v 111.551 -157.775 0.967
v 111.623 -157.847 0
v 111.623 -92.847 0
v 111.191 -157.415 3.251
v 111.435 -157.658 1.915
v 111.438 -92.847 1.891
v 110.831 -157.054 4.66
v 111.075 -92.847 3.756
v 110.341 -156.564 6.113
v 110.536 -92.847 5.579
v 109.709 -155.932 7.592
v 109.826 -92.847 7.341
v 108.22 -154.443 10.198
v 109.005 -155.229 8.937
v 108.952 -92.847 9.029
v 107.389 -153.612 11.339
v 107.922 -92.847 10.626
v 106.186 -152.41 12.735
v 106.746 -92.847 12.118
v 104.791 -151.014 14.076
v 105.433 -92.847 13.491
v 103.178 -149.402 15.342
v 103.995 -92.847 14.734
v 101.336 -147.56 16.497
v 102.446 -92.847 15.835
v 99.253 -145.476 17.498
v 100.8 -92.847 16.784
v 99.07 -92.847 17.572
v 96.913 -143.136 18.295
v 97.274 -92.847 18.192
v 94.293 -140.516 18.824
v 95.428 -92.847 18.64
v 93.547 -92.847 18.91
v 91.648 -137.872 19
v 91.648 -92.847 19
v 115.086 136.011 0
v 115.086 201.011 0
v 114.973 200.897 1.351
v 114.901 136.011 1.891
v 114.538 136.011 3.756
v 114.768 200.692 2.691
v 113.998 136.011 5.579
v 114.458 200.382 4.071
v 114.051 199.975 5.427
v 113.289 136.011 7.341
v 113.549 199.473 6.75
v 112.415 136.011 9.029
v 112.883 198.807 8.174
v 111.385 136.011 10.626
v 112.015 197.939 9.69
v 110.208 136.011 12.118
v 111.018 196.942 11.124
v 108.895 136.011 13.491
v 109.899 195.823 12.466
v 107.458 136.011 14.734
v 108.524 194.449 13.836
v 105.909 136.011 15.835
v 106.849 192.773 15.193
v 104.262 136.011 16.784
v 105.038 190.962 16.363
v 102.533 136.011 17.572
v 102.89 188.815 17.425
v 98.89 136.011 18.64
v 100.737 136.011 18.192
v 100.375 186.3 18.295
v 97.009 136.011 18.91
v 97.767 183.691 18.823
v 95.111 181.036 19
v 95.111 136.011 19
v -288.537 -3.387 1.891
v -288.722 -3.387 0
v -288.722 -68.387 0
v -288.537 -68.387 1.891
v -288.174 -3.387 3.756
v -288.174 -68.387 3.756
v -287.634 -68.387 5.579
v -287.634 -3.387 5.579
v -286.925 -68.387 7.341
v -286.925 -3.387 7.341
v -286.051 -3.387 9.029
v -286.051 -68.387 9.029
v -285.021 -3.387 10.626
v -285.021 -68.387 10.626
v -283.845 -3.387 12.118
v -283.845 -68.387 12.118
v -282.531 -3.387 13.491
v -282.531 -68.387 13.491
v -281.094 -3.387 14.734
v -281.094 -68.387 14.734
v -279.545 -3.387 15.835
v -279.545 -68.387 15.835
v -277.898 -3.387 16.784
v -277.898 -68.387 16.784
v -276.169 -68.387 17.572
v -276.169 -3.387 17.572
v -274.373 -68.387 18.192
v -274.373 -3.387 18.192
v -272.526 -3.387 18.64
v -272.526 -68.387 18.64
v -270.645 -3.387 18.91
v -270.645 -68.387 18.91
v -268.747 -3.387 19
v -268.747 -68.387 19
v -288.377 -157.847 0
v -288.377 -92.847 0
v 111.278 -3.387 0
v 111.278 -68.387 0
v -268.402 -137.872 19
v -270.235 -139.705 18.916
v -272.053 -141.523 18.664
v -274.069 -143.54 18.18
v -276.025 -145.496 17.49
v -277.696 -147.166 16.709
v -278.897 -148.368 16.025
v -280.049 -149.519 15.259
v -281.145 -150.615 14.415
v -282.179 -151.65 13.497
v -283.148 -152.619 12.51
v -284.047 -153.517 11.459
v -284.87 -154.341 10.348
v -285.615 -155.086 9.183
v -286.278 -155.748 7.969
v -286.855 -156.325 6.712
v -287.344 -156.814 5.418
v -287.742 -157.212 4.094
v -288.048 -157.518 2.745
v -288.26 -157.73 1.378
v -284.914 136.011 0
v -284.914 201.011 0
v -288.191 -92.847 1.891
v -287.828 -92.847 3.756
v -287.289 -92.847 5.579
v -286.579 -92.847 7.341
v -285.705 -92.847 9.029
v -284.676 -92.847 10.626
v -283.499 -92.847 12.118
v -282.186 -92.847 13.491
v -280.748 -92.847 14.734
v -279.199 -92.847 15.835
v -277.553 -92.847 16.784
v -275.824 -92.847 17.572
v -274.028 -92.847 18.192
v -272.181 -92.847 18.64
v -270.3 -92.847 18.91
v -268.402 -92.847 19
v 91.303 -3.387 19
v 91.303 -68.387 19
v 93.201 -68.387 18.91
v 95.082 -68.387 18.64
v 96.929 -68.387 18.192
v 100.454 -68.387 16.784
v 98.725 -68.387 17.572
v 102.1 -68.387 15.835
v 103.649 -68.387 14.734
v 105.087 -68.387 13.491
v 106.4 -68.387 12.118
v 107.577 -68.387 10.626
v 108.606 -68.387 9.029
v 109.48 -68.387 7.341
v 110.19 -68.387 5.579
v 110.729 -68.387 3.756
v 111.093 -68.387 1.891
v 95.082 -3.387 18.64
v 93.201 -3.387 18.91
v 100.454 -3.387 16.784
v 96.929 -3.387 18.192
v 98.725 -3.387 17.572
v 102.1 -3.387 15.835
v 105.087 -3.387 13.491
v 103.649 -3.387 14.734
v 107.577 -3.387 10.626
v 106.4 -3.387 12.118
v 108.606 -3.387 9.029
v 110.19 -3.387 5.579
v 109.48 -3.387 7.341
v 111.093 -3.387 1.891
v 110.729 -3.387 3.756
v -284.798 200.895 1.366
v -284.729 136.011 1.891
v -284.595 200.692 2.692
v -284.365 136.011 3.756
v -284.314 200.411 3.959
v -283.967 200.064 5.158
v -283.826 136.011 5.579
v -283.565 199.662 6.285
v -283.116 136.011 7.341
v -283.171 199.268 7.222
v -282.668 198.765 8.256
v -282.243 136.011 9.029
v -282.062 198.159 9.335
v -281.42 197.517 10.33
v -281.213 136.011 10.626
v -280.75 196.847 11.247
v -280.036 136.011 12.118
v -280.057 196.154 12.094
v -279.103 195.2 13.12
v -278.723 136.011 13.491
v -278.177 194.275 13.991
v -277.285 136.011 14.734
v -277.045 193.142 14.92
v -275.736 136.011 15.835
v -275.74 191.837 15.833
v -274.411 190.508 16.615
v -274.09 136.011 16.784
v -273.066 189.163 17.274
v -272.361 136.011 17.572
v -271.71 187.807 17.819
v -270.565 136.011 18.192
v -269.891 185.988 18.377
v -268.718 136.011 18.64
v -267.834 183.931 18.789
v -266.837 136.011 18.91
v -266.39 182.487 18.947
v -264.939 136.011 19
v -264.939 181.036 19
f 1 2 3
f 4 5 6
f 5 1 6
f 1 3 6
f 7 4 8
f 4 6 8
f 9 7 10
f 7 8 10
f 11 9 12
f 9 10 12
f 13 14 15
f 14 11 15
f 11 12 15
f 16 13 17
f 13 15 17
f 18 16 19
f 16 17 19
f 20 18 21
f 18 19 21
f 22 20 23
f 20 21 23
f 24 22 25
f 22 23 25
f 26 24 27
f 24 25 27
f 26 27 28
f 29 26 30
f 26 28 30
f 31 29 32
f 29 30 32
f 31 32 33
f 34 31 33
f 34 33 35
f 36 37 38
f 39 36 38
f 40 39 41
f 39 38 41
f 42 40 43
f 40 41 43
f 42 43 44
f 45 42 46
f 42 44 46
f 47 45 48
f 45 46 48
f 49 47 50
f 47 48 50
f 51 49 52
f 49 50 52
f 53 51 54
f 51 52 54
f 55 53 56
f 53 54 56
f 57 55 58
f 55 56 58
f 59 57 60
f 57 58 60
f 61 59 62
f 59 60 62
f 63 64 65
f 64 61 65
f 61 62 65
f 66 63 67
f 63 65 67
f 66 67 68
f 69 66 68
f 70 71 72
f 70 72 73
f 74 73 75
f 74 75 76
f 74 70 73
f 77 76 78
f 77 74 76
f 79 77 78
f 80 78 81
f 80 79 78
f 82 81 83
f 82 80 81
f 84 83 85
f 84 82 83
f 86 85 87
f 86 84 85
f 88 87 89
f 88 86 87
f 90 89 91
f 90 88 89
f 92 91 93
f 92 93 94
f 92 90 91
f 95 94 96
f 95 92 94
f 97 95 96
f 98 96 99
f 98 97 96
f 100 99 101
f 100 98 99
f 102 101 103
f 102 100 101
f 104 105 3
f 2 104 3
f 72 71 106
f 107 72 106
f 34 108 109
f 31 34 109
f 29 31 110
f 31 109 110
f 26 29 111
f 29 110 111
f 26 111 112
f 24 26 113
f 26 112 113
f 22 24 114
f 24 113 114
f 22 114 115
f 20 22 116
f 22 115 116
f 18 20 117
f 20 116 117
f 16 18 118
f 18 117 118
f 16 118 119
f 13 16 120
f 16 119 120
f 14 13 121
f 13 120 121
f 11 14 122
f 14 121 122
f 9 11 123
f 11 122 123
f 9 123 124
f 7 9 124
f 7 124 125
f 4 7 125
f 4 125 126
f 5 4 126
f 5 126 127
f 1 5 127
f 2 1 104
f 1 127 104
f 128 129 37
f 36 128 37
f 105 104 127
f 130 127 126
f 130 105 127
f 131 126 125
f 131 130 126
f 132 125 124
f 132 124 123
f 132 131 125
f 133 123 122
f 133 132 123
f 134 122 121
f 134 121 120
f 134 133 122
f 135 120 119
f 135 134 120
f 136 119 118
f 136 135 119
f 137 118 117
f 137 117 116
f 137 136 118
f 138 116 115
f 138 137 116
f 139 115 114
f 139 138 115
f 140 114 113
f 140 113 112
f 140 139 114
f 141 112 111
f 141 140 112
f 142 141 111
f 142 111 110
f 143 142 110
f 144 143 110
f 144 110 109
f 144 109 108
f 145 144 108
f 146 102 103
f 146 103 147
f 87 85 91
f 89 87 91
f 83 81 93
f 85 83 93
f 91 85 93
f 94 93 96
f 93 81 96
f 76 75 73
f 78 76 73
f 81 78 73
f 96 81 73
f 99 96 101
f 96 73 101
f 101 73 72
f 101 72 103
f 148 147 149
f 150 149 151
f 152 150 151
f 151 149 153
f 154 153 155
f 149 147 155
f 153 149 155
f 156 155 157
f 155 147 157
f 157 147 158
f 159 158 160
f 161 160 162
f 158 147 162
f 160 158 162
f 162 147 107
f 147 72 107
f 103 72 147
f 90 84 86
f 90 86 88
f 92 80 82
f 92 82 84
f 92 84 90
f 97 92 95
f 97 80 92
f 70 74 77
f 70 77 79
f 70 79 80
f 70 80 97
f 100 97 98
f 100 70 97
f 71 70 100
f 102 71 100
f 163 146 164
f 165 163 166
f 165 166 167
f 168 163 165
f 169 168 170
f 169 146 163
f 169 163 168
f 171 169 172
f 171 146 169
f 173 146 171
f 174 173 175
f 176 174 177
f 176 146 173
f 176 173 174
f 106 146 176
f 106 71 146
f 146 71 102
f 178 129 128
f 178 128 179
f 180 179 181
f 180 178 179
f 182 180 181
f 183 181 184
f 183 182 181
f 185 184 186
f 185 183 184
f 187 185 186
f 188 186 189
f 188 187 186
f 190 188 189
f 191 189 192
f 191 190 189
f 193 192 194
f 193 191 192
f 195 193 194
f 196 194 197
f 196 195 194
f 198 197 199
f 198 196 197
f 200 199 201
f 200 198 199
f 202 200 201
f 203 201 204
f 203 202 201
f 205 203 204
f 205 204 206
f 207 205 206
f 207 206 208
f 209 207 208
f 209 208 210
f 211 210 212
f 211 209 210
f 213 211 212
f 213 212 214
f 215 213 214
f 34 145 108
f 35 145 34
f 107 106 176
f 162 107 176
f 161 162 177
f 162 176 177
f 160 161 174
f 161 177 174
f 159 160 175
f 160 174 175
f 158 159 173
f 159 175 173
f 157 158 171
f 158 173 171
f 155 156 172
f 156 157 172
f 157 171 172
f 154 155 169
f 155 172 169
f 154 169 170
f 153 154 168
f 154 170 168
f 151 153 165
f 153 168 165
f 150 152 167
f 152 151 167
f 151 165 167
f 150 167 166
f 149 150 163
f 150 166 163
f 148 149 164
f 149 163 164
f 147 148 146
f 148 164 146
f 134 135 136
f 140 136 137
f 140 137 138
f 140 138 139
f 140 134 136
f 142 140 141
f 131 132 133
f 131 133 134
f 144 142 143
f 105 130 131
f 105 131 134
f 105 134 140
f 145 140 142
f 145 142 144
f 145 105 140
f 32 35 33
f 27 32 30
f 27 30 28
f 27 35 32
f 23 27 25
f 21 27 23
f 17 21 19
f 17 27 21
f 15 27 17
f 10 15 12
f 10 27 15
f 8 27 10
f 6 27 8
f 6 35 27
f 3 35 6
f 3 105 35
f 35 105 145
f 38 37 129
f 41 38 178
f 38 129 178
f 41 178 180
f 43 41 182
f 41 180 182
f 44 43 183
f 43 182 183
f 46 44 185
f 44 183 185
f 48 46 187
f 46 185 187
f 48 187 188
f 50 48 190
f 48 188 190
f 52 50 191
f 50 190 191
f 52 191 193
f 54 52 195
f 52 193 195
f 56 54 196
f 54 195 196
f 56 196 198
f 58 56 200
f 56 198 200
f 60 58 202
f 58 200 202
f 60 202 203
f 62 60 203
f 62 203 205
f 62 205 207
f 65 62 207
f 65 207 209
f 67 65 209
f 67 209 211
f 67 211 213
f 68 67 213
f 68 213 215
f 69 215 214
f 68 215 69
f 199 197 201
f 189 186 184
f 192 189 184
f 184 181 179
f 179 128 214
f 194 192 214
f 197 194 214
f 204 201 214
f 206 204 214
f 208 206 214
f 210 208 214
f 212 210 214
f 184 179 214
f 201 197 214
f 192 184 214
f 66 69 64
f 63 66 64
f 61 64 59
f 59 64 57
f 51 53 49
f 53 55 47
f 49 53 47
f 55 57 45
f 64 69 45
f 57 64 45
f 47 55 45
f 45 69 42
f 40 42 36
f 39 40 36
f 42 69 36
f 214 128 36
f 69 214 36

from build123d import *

# Parameters (mm, degrees)
F0_W         = 400
F0_H         = 65
F1_DEPTH     = 19
F2_W         = 400
F2_H         = 65
F3_DEPTH     = 19
F4_W         = 400
F4_H         = 65
F5_DEPTH     = 19
F6_T1_DEPTH  = 164.8749217772
F7_T1_DEPTH  = 164.8749217772
F8_T1_DEPTH  = 164.8749217772
F9_T1_DEPTH  = 479.8999374217
F10_T1_DEPTH = 144.8999374218
F11_T1_DEPTH = 164.8749217772
F12_T1_DEPTH = 479.8999374217
F13_T1_DEPTH = 144.8999374218


# Not quite as in the source:
# - a fillet or chamfer that OpenCascade refuses, or shapes differently, is made with other operations: its cross-section is extruded or revolved along the edge and cut away or added


with BuildPart() as f1:
    # F0 (on Top) → F1 (new body)
    with BuildSketch(Plane.XY):
        with Locations((-84.9136711072, 168.510709955)):
            Rectangle(F0_W, F0_H)
    extrude(amount=F1_DEPTH)

    # F6: fillet of radius 20 on 1 edges, made by hand

    # F6_s2 → F6_t1 (cut)
    with BuildSketch(Plane.XZ.offset(-250.9481708436)):
        with BuildLine():
            ThreePointArc((115.0863288928, 0), (108.8953932895, 13.4913767462), (95.1113445374, 19))
            Line((95.1113445374, 19), (115.0863288928, 19))
            Line((115.0863288928, 19), (115.0863288928, 0))
        make_face()
    extrude(amount=F6_T1_DEPTH, mode=Mode.SUBTRACT)

    # F12: fillet of radius 20 on 1 edges, made by hand

    # F12_s2 → F12_t1 (cut)
    with BuildSketch(Plane.YZ.offset(-334.8511319958)):
        with BuildLine():
            ThreePointArc((201.010709955, 0), (194.8197743517, 13.4913767462), (181.0357255996, 19))
            Line((181.0357255996, 19), (201.010709955, 19))
            Line((201.010709955, 19), (201.010709955, 0))
        make_face()
    extrude(amount=F12_T1_DEPTH, mode=Mode.SUBTRACT)

    # F13: fillet of radius 20 on 1 edges, made by hand

    # F13_s2 → F13_t1 (cut)
    with BuildSketch(Plane.XZ.offset(-230.9731864882)):
        with BuildLine():
            ThreePointArc((-284.9136711072, 0), (-278.7227355038, 13.4913767462), (-264.9386867517, 19))
            Line((-264.9386867517, 19), (-284.9136711072, 19))
            Line((-284.9136711072, 19), (-284.9136711072, 0))
        make_face()
    extrude(amount=F13_T1_DEPTH, mode=Mode.SUBTRACT)


with BuildPart() as f3:
    # F2 (on Top) → F3 (new body)
    with BuildSketch(Plane.XY):
        with Locations((-88.7223696336, -35.8872577905)):
            Rectangle(F2_W, F2_H)
    extrude(amount=F3_DEPTH)

    # F7: fillet of radius 20 on 1 edges, made by hand

    # F7_s2 → F7_t1 (cut)
    with BuildSketch(Plane.XZ.offset(-46.5502030981)):
        with BuildLine():
            ThreePointArc((111.2776303664, 0), (105.086694763, 13.4913767462), (91.3026460109, 19))
            Line((91.3026460109, 19), (111.2776303664, 19))
            Line((111.2776303664, 19), (111.2776303664, 0))
        make_face()
    extrude(amount=F7_T1_DEPTH, mode=Mode.SUBTRACT)

    # F11: fillet of radius 20 on 1 edges, made by hand

    # F11_s2 → F11_t1 (cut)
    with BuildSketch(Plane.XZ.offset(-46.5502030981)):
        with BuildLine():
            ThreePointArc((-288.7223696336, 0), (-282.5314340303, 13.4913767462), (-268.7473852782, 19))
            Line((-268.7473852782, 19), (-288.7223696336, 19))
            Line((-288.7223696336, 19), (-288.7223696336, 0))
        make_face()
    extrude(amount=F11_T1_DEPTH, mode=Mode.SUBTRACT)


with BuildPart() as f5:
    # F4 (on Top) → F5 (new body)
    with BuildSketch(Plane.XY):
        with Locations((-88.3765639737, -125.3469542844)):
            Rectangle(F4_W, F4_H)
    extrude(amount=F5_DEPTH)

    # F8: fillet of radius 20 on 1 edges, made by hand

    # F8_s2 → F8_t1 (cut)
    with BuildSketch(Plane.XZ.offset(42.9094933958)):
        with BuildLine():
            ThreePointArc((111.6234360263, 0), (105.4325004229, 13.4913767462), (91.6484516708, 19))
            Line((91.6484516708, 19), (111.6234360263, 19))
            Line((111.6234360263, 19), (111.6234360263, 0))
        make_face()
    extrude(amount=F8_T1_DEPTH, mode=Mode.SUBTRACT)

    # F9: fillet of radius 20 on 1 edges, made by hand

    # F9_s2 → F9_t1 (cut)
    with BuildSketch(Plane.YZ.offset(-338.3140248623)):
        with BuildLine():
            ThreePointArc((-137.871969929, 19), (-151.6560186811, 13.4913767462), (-157.8469542844, 0))
            Line((-157.8469542844, 0), (-157.8469542844, 19))
            Line((-157.8469542844, 19), (-137.871969929, 19))
        make_face()
    extrude(amount=F9_T1_DEPTH, mode=Mode.SUBTRACT)

    # F10: fillet of radius 20 on 1 edges, made by hand

    # F10_s2 → F10_t1 (cut)
    with BuildSketch(Plane.XZ.offset(42.9094933958)):
        with BuildLine():
            ThreePointArc((-288.3765639737, 0), (-282.1856283704, 13.4913767462), (-268.4015796183, 19))
            Line((-268.4015796183, 19), (-288.3765639737, 19))
            Line((-288.3765639737, 19), (-288.3765639737, 0))
        make_face()
    extrude(amount=F10_T1_DEPTH, mode=Mode.SUBTRACT)


solid = Compound([f1.part, f3.part, f5.part])
